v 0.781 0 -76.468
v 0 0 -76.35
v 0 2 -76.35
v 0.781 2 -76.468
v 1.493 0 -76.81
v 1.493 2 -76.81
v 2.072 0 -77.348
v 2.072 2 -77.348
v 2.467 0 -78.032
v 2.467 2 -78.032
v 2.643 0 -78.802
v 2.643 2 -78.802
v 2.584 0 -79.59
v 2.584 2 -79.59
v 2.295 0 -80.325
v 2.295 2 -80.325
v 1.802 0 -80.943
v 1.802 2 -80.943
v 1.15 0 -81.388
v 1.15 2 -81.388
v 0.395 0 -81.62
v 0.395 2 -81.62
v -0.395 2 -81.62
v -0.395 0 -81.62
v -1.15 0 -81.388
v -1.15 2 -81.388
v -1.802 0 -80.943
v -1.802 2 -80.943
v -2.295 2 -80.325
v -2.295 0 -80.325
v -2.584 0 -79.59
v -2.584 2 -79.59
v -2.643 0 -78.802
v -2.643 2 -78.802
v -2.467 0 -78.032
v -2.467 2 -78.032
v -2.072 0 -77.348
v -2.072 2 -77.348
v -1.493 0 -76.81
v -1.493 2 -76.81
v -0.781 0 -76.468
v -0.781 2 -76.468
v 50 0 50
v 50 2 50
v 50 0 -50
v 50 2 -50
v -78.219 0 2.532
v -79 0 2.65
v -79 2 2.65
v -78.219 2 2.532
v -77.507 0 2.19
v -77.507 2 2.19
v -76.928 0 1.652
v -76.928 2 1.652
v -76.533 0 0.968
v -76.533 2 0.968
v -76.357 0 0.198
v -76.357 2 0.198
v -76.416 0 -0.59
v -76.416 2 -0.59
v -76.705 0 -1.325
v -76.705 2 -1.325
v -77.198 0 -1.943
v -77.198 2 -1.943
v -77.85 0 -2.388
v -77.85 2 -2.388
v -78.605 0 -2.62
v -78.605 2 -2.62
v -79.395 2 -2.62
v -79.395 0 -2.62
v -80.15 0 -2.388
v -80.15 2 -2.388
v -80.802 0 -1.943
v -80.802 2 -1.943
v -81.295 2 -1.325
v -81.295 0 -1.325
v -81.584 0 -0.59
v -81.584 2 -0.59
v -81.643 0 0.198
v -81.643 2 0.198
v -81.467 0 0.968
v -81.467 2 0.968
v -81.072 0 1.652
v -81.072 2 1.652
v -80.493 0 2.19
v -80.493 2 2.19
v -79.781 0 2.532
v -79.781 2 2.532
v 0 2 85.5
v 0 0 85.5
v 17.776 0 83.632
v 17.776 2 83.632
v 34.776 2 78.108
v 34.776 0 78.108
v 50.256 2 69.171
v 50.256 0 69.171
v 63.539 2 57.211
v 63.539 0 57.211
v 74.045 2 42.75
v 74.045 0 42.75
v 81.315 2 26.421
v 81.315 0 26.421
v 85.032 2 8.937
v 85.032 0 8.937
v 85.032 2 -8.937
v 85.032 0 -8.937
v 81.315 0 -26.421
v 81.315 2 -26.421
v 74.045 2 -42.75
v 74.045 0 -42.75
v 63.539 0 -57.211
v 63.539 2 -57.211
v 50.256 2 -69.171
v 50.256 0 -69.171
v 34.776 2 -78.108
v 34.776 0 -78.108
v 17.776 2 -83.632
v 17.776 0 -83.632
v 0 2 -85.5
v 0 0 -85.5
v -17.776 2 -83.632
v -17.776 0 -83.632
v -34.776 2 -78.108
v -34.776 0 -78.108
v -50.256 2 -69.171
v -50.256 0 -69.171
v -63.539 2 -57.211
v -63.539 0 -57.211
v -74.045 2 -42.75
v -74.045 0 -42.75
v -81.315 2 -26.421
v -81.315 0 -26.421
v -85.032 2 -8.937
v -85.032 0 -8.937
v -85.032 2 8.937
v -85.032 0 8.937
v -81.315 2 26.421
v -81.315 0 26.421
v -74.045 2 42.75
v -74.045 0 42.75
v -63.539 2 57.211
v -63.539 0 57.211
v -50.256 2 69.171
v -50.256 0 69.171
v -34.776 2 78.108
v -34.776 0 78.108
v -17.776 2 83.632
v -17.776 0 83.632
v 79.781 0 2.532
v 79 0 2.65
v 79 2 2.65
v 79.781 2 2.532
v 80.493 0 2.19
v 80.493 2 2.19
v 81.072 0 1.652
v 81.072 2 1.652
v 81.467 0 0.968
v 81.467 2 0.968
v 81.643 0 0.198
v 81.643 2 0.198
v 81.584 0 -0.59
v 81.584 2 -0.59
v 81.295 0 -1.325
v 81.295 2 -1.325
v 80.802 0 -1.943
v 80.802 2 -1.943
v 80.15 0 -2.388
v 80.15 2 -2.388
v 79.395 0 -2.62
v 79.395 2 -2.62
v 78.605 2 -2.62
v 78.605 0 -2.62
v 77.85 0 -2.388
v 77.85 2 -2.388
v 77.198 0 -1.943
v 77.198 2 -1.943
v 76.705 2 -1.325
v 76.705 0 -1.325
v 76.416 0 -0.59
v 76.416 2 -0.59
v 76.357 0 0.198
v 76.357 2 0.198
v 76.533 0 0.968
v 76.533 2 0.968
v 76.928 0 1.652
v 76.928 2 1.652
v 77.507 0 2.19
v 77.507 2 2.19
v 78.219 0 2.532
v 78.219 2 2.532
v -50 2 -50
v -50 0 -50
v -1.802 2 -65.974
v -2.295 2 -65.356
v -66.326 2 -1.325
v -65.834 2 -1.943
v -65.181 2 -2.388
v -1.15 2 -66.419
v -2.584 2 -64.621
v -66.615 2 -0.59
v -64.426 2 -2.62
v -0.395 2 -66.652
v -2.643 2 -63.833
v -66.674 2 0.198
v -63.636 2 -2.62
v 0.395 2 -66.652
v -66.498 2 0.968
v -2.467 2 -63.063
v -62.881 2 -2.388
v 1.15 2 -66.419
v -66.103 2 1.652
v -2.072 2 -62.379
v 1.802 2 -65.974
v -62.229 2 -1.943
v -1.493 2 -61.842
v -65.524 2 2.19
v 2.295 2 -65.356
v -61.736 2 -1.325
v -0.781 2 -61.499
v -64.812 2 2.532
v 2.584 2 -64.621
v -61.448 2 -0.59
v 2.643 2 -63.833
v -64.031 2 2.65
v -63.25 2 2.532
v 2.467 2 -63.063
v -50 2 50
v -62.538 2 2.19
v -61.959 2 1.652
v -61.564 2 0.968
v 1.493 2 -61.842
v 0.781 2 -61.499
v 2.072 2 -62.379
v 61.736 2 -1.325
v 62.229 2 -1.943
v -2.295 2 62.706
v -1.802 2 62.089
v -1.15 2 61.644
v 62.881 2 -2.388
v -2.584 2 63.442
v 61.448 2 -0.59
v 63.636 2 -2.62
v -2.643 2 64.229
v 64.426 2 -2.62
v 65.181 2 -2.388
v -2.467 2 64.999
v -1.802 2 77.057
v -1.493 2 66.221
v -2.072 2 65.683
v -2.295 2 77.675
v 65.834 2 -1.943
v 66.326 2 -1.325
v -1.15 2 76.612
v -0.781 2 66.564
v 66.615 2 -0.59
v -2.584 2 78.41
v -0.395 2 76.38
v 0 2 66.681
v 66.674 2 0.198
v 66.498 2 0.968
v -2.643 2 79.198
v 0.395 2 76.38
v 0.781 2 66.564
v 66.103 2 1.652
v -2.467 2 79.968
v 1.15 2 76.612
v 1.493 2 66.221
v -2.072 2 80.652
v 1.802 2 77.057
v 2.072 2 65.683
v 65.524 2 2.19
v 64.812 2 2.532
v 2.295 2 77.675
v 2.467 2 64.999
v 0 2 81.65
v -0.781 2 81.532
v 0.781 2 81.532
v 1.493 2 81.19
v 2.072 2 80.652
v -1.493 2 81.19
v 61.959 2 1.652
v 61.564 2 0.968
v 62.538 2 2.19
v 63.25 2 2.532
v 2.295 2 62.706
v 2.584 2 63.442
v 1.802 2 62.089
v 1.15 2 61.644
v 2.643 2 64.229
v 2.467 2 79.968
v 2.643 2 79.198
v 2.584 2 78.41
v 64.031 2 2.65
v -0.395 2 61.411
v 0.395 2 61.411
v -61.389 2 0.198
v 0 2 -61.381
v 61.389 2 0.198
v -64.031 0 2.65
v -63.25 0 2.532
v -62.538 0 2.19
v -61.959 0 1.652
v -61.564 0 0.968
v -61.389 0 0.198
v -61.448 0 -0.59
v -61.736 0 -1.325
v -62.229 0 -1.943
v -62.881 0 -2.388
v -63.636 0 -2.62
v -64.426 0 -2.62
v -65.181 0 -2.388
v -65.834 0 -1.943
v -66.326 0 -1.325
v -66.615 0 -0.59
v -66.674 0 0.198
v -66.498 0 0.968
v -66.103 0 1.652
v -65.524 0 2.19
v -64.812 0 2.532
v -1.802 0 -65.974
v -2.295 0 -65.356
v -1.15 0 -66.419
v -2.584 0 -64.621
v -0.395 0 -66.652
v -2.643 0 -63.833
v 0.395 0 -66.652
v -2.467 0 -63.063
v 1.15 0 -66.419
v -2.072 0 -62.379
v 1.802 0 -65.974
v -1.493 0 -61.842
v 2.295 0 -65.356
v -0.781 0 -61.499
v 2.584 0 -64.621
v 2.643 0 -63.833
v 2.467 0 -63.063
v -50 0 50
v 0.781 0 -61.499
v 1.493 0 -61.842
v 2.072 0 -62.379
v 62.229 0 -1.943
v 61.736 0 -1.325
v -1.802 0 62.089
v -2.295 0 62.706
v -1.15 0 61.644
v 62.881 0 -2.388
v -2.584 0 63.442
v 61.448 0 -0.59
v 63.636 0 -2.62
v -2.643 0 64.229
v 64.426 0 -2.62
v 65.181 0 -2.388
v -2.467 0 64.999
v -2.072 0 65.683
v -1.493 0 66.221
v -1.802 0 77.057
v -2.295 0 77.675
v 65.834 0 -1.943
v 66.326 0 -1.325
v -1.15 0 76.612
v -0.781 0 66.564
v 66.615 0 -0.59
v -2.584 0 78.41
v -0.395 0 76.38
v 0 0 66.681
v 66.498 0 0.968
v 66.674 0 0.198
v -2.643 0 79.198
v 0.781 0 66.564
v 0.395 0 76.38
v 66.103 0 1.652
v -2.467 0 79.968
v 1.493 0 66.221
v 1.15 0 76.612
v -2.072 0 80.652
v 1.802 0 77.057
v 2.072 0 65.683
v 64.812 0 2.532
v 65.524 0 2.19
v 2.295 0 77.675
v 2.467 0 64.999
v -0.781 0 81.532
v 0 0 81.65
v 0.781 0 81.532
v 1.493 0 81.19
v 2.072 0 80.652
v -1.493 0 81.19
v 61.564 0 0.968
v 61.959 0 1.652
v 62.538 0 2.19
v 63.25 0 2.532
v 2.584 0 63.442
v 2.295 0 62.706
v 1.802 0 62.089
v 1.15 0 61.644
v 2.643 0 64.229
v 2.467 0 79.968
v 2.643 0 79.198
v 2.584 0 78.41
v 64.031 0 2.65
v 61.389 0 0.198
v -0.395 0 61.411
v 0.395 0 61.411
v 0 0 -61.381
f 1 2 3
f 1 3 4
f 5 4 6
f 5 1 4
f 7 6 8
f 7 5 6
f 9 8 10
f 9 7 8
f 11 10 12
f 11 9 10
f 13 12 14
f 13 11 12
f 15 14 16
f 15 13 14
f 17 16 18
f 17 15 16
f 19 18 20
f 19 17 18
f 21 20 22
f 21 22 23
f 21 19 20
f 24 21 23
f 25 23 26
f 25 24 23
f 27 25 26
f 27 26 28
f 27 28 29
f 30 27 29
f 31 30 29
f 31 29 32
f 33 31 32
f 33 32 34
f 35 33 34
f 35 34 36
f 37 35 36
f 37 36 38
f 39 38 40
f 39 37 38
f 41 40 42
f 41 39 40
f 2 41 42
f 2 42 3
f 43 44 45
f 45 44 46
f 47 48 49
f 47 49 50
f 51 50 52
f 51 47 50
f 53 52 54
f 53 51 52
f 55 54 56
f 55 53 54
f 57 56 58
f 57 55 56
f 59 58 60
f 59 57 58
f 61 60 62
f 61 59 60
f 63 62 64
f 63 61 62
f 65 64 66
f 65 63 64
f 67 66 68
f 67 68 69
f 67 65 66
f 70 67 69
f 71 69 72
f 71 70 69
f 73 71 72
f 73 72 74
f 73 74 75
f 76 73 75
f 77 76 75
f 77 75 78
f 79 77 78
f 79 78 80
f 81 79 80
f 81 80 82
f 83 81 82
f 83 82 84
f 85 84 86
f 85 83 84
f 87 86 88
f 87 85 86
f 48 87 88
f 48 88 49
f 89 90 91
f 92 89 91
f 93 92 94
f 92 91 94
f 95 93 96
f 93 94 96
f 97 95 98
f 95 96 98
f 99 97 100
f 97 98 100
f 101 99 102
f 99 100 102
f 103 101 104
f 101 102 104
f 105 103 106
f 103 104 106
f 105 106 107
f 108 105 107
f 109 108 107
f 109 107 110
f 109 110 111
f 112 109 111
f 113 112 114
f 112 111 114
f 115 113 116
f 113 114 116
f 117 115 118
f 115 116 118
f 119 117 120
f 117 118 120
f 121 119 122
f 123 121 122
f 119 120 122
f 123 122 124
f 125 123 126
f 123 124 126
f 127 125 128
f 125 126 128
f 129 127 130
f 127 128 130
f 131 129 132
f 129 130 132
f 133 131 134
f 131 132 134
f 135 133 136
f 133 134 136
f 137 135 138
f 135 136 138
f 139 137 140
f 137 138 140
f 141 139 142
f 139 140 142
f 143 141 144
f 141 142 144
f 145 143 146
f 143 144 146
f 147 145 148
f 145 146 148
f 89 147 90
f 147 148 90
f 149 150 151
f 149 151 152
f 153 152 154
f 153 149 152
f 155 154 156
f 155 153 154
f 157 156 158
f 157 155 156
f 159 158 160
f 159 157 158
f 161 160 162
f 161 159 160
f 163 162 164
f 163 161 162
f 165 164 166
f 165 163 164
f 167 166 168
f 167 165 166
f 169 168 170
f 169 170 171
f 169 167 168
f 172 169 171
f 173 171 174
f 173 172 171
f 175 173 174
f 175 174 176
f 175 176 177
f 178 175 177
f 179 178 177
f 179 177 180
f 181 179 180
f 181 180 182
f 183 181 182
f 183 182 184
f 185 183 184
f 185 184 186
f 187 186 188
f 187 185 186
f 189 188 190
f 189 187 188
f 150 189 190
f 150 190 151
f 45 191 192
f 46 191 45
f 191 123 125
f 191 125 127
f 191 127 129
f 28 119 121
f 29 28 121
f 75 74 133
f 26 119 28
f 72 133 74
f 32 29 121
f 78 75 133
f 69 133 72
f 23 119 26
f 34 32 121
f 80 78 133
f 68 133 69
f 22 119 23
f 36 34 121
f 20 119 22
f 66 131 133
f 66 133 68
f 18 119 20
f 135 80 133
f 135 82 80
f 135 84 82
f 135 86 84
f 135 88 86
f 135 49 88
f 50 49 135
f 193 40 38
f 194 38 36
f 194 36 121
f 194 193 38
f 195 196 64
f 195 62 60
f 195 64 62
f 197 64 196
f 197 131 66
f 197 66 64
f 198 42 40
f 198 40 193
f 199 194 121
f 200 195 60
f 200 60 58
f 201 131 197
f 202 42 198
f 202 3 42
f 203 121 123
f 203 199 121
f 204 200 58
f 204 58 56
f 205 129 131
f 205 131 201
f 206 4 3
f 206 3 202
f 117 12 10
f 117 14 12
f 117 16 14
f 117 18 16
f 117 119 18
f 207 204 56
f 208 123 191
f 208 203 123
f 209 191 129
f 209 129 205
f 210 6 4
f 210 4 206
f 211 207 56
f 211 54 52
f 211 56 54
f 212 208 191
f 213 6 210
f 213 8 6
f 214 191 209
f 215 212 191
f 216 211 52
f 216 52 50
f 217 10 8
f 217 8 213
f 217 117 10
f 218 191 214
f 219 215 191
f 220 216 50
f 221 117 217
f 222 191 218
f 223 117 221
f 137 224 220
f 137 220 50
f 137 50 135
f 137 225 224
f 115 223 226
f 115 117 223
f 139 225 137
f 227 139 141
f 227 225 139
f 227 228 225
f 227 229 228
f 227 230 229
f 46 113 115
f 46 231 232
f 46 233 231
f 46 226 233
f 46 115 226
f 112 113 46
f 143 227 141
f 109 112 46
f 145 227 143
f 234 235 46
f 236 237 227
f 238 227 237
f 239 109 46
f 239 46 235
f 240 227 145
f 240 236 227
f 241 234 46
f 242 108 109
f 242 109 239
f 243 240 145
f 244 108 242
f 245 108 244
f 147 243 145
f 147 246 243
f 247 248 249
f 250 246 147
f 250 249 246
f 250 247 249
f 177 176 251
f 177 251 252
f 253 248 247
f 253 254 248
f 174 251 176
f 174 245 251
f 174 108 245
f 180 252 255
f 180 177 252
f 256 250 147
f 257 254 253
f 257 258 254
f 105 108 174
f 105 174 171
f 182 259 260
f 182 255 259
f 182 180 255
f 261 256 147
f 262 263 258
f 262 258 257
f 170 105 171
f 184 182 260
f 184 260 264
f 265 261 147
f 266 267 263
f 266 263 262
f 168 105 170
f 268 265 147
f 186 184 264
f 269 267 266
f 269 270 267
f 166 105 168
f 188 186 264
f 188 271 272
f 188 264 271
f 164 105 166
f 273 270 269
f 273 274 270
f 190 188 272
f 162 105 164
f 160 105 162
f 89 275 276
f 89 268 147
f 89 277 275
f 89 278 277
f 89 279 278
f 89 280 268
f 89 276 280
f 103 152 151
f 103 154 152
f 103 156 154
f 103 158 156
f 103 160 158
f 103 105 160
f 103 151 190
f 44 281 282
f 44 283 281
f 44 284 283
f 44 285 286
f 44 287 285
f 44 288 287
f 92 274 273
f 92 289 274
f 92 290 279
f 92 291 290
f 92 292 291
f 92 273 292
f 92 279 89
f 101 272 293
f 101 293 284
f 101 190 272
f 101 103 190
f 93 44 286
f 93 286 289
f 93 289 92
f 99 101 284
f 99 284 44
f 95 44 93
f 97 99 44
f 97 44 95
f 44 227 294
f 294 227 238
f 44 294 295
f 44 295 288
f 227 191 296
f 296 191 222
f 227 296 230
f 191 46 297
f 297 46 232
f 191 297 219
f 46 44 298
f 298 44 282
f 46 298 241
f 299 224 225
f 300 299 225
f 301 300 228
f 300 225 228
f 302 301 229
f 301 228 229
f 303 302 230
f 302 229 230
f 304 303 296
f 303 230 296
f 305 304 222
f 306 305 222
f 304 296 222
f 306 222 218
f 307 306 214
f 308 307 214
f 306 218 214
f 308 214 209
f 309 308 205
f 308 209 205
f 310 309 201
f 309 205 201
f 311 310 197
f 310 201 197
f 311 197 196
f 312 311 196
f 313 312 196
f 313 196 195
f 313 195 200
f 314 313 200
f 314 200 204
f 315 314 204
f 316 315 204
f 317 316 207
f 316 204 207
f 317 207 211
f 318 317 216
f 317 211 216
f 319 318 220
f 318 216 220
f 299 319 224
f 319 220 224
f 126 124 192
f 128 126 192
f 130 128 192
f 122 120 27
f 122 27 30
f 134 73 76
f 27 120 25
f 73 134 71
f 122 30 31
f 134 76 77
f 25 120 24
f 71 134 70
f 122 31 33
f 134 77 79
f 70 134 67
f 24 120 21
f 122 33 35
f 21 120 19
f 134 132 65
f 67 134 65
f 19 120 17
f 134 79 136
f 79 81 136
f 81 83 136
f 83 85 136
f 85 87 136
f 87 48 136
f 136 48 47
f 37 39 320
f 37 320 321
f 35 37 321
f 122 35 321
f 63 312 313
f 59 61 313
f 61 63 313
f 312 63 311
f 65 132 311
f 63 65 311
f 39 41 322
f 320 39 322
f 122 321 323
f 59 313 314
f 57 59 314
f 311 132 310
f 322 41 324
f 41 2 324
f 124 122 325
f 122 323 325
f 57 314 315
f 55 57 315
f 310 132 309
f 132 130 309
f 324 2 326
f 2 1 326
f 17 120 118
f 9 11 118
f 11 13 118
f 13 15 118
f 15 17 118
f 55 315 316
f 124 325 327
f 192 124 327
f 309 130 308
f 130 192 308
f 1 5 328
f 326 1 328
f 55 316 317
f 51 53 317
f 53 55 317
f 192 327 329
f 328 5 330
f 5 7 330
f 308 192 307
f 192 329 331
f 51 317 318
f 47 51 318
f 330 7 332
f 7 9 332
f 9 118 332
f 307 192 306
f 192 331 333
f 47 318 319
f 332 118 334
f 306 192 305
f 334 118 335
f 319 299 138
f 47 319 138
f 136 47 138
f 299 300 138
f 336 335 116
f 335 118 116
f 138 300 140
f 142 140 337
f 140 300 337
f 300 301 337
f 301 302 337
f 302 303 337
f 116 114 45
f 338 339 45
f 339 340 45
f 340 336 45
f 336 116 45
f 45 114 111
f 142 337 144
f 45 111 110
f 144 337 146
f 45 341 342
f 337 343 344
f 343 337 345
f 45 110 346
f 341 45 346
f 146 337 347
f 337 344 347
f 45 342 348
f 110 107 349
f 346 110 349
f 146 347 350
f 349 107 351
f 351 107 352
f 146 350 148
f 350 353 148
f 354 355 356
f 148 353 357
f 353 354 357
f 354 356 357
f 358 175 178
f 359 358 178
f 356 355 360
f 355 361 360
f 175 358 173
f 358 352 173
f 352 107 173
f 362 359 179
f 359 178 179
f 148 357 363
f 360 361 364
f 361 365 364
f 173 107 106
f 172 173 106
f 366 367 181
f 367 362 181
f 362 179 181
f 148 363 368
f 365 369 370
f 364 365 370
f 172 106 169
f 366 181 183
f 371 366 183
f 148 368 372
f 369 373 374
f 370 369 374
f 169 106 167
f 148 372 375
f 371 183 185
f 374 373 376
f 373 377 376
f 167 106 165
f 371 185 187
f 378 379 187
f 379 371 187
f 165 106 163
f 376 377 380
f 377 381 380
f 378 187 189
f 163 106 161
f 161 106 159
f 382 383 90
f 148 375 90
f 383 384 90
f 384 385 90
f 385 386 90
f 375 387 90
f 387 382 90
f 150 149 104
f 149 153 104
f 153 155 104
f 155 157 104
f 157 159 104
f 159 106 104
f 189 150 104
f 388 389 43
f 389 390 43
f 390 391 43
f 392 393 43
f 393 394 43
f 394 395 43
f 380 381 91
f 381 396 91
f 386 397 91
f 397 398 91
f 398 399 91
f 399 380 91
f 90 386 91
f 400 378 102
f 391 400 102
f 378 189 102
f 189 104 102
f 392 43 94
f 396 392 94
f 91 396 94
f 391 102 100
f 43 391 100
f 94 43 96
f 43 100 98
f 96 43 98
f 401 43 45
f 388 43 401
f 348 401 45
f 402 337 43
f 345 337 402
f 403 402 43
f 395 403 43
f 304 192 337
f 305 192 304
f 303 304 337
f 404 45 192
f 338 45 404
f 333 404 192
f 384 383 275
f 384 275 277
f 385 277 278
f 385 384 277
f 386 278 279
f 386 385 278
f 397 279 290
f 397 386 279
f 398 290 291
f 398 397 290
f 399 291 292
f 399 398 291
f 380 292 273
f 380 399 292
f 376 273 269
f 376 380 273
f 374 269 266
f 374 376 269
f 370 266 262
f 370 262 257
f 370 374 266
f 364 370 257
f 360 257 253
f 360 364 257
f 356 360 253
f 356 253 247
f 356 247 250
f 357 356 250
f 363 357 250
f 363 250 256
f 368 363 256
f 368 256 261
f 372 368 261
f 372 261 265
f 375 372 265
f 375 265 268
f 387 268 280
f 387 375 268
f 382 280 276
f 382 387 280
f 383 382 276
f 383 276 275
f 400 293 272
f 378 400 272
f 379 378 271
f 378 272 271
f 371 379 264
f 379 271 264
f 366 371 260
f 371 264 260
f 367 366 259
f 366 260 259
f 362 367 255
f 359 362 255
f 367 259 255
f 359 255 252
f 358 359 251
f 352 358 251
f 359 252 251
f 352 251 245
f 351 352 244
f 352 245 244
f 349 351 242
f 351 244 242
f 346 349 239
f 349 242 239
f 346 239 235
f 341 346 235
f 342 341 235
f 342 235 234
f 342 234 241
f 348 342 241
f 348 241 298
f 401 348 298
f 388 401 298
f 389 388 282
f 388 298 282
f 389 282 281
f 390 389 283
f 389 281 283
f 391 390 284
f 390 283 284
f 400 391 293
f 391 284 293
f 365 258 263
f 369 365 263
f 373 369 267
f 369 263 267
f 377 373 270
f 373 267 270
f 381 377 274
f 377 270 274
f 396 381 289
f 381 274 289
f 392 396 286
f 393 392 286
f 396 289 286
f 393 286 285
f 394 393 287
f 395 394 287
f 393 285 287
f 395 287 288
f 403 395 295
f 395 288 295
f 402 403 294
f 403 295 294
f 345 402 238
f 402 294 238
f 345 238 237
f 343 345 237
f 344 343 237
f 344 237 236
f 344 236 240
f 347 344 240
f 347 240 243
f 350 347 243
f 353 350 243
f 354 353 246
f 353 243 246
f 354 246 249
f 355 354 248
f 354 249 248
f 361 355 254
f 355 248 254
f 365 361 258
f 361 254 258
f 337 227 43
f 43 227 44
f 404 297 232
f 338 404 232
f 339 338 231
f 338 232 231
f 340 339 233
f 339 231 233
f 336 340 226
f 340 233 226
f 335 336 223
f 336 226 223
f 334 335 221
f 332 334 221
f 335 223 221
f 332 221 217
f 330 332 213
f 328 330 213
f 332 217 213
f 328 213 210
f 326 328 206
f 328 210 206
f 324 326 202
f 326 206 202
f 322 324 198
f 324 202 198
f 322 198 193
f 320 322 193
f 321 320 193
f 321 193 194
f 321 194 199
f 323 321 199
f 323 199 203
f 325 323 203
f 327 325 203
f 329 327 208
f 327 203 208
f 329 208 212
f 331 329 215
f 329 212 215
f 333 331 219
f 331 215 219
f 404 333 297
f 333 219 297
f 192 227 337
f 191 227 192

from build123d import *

# Parameters (mm, degrees)
SKETCH_1_R          = 85.5
SKETCH_1_R_2        = 2.65
EXTRUDE_1_DEPTH     = 2
SKETCH_2_W          = 40
SKETCH_2_H          = 100
CUT_EXTRUDE_2_DEPTH = 2
SKETCH_4_R          = 2.65
CUT_EXTRUDE_3_DEPTH = 2
SKETCH_5_W          = 100
SKETCH_5_H          = 100
CUT_EXTRUDE_4_DEPTH = 2


with BuildPart() as part:
    # 草图1 → 凸台-拉伸1 (new body)
    with BuildSketch(Plane(origin=(0, 0, 0), x_dir=(1, 0, 0), z_dir=(0, 1, 0))):
        with Locations(Location((0, 0, 0), (0, 0, 270))):
            Circle(SKETCH_1_R)
        with Locations(Location((0, 79, 0), (0, 0, 270))):
            Circle(SKETCH_1_R_2, mode=Mode.SUBTRACT)
        with Locations(Location((79, 0, 0), (0, 0, 270))):
            Circle(SKETCH_1_R_2, mode=Mode.SUBTRACT)
        with Locations(Location((0, -79, 0), (0, 0, 270))):
            Circle(SKETCH_1_R_2, mode=Mode.SUBTRACT)
        with Locations(Location((-79, 0, 0), (0, 0, 270))):
            Circle(SKETCH_1_R_2, mode=Mode.SUBTRACT)
    extrude(amount=EXTRUDE_1_DEPTH)

    # 草图2 → 切除-拉伸2 (cut)
    with BuildSketch(Plane(origin=(0, 2, 0), x_dir=(1, 0, 0), z_dir=(0, 1, 0))):
        with Locations((-20, 0)):
            Rectangle(SKETCH_2_W, SKETCH_2_H)
        with Locations((20, 0)):
            Rectangle(SKETCH_2_W, SKETCH_2_H)
    extrude(amount=-CUT_EXTRUDE_2_DEPTH, mode=Mode.SUBTRACT)

    # 草图4 → 切除-拉伸3 (cut)
    with BuildSketch(Plane(origin=(0, 2, 0), x_dir=(1, 0, 0), z_dir=(0, 1, 0))):
        with Locations(Location((0, 64.031242374, 0), (0, 0, 270))):
            Circle(SKETCH_4_R)
        with Locations(Location((64.031242374, 0, 0), (0, 0, 270))):
            Circle(SKETCH_4_R)
        with Locations(Location((0, -64.031242374, 0), (0, 0, 270))):
            Circle(SKETCH_4_R)
        with Locations(Location((-64.031242374, 0, 0), (0, 0, 270))):
            Circle(SKETCH_4_R)
    extrude(amount=-CUT_EXTRUDE_3_DEPTH, mode=Mode.SUBTRACT)

    # 草图5 → 切除-拉伸4 (cut)
    with BuildSketch(Plane(origin=(0, 2, 0), x_dir=(1, 0, 0), z_dir=(0, 1, 0))):
        Rectangle(SKETCH_5_W, SKETCH_5_H)
    extrude(amount=-CUT_EXTRUDE_4_DEPTH, mode=Mode.SUBTRACT)


solid = part.part
